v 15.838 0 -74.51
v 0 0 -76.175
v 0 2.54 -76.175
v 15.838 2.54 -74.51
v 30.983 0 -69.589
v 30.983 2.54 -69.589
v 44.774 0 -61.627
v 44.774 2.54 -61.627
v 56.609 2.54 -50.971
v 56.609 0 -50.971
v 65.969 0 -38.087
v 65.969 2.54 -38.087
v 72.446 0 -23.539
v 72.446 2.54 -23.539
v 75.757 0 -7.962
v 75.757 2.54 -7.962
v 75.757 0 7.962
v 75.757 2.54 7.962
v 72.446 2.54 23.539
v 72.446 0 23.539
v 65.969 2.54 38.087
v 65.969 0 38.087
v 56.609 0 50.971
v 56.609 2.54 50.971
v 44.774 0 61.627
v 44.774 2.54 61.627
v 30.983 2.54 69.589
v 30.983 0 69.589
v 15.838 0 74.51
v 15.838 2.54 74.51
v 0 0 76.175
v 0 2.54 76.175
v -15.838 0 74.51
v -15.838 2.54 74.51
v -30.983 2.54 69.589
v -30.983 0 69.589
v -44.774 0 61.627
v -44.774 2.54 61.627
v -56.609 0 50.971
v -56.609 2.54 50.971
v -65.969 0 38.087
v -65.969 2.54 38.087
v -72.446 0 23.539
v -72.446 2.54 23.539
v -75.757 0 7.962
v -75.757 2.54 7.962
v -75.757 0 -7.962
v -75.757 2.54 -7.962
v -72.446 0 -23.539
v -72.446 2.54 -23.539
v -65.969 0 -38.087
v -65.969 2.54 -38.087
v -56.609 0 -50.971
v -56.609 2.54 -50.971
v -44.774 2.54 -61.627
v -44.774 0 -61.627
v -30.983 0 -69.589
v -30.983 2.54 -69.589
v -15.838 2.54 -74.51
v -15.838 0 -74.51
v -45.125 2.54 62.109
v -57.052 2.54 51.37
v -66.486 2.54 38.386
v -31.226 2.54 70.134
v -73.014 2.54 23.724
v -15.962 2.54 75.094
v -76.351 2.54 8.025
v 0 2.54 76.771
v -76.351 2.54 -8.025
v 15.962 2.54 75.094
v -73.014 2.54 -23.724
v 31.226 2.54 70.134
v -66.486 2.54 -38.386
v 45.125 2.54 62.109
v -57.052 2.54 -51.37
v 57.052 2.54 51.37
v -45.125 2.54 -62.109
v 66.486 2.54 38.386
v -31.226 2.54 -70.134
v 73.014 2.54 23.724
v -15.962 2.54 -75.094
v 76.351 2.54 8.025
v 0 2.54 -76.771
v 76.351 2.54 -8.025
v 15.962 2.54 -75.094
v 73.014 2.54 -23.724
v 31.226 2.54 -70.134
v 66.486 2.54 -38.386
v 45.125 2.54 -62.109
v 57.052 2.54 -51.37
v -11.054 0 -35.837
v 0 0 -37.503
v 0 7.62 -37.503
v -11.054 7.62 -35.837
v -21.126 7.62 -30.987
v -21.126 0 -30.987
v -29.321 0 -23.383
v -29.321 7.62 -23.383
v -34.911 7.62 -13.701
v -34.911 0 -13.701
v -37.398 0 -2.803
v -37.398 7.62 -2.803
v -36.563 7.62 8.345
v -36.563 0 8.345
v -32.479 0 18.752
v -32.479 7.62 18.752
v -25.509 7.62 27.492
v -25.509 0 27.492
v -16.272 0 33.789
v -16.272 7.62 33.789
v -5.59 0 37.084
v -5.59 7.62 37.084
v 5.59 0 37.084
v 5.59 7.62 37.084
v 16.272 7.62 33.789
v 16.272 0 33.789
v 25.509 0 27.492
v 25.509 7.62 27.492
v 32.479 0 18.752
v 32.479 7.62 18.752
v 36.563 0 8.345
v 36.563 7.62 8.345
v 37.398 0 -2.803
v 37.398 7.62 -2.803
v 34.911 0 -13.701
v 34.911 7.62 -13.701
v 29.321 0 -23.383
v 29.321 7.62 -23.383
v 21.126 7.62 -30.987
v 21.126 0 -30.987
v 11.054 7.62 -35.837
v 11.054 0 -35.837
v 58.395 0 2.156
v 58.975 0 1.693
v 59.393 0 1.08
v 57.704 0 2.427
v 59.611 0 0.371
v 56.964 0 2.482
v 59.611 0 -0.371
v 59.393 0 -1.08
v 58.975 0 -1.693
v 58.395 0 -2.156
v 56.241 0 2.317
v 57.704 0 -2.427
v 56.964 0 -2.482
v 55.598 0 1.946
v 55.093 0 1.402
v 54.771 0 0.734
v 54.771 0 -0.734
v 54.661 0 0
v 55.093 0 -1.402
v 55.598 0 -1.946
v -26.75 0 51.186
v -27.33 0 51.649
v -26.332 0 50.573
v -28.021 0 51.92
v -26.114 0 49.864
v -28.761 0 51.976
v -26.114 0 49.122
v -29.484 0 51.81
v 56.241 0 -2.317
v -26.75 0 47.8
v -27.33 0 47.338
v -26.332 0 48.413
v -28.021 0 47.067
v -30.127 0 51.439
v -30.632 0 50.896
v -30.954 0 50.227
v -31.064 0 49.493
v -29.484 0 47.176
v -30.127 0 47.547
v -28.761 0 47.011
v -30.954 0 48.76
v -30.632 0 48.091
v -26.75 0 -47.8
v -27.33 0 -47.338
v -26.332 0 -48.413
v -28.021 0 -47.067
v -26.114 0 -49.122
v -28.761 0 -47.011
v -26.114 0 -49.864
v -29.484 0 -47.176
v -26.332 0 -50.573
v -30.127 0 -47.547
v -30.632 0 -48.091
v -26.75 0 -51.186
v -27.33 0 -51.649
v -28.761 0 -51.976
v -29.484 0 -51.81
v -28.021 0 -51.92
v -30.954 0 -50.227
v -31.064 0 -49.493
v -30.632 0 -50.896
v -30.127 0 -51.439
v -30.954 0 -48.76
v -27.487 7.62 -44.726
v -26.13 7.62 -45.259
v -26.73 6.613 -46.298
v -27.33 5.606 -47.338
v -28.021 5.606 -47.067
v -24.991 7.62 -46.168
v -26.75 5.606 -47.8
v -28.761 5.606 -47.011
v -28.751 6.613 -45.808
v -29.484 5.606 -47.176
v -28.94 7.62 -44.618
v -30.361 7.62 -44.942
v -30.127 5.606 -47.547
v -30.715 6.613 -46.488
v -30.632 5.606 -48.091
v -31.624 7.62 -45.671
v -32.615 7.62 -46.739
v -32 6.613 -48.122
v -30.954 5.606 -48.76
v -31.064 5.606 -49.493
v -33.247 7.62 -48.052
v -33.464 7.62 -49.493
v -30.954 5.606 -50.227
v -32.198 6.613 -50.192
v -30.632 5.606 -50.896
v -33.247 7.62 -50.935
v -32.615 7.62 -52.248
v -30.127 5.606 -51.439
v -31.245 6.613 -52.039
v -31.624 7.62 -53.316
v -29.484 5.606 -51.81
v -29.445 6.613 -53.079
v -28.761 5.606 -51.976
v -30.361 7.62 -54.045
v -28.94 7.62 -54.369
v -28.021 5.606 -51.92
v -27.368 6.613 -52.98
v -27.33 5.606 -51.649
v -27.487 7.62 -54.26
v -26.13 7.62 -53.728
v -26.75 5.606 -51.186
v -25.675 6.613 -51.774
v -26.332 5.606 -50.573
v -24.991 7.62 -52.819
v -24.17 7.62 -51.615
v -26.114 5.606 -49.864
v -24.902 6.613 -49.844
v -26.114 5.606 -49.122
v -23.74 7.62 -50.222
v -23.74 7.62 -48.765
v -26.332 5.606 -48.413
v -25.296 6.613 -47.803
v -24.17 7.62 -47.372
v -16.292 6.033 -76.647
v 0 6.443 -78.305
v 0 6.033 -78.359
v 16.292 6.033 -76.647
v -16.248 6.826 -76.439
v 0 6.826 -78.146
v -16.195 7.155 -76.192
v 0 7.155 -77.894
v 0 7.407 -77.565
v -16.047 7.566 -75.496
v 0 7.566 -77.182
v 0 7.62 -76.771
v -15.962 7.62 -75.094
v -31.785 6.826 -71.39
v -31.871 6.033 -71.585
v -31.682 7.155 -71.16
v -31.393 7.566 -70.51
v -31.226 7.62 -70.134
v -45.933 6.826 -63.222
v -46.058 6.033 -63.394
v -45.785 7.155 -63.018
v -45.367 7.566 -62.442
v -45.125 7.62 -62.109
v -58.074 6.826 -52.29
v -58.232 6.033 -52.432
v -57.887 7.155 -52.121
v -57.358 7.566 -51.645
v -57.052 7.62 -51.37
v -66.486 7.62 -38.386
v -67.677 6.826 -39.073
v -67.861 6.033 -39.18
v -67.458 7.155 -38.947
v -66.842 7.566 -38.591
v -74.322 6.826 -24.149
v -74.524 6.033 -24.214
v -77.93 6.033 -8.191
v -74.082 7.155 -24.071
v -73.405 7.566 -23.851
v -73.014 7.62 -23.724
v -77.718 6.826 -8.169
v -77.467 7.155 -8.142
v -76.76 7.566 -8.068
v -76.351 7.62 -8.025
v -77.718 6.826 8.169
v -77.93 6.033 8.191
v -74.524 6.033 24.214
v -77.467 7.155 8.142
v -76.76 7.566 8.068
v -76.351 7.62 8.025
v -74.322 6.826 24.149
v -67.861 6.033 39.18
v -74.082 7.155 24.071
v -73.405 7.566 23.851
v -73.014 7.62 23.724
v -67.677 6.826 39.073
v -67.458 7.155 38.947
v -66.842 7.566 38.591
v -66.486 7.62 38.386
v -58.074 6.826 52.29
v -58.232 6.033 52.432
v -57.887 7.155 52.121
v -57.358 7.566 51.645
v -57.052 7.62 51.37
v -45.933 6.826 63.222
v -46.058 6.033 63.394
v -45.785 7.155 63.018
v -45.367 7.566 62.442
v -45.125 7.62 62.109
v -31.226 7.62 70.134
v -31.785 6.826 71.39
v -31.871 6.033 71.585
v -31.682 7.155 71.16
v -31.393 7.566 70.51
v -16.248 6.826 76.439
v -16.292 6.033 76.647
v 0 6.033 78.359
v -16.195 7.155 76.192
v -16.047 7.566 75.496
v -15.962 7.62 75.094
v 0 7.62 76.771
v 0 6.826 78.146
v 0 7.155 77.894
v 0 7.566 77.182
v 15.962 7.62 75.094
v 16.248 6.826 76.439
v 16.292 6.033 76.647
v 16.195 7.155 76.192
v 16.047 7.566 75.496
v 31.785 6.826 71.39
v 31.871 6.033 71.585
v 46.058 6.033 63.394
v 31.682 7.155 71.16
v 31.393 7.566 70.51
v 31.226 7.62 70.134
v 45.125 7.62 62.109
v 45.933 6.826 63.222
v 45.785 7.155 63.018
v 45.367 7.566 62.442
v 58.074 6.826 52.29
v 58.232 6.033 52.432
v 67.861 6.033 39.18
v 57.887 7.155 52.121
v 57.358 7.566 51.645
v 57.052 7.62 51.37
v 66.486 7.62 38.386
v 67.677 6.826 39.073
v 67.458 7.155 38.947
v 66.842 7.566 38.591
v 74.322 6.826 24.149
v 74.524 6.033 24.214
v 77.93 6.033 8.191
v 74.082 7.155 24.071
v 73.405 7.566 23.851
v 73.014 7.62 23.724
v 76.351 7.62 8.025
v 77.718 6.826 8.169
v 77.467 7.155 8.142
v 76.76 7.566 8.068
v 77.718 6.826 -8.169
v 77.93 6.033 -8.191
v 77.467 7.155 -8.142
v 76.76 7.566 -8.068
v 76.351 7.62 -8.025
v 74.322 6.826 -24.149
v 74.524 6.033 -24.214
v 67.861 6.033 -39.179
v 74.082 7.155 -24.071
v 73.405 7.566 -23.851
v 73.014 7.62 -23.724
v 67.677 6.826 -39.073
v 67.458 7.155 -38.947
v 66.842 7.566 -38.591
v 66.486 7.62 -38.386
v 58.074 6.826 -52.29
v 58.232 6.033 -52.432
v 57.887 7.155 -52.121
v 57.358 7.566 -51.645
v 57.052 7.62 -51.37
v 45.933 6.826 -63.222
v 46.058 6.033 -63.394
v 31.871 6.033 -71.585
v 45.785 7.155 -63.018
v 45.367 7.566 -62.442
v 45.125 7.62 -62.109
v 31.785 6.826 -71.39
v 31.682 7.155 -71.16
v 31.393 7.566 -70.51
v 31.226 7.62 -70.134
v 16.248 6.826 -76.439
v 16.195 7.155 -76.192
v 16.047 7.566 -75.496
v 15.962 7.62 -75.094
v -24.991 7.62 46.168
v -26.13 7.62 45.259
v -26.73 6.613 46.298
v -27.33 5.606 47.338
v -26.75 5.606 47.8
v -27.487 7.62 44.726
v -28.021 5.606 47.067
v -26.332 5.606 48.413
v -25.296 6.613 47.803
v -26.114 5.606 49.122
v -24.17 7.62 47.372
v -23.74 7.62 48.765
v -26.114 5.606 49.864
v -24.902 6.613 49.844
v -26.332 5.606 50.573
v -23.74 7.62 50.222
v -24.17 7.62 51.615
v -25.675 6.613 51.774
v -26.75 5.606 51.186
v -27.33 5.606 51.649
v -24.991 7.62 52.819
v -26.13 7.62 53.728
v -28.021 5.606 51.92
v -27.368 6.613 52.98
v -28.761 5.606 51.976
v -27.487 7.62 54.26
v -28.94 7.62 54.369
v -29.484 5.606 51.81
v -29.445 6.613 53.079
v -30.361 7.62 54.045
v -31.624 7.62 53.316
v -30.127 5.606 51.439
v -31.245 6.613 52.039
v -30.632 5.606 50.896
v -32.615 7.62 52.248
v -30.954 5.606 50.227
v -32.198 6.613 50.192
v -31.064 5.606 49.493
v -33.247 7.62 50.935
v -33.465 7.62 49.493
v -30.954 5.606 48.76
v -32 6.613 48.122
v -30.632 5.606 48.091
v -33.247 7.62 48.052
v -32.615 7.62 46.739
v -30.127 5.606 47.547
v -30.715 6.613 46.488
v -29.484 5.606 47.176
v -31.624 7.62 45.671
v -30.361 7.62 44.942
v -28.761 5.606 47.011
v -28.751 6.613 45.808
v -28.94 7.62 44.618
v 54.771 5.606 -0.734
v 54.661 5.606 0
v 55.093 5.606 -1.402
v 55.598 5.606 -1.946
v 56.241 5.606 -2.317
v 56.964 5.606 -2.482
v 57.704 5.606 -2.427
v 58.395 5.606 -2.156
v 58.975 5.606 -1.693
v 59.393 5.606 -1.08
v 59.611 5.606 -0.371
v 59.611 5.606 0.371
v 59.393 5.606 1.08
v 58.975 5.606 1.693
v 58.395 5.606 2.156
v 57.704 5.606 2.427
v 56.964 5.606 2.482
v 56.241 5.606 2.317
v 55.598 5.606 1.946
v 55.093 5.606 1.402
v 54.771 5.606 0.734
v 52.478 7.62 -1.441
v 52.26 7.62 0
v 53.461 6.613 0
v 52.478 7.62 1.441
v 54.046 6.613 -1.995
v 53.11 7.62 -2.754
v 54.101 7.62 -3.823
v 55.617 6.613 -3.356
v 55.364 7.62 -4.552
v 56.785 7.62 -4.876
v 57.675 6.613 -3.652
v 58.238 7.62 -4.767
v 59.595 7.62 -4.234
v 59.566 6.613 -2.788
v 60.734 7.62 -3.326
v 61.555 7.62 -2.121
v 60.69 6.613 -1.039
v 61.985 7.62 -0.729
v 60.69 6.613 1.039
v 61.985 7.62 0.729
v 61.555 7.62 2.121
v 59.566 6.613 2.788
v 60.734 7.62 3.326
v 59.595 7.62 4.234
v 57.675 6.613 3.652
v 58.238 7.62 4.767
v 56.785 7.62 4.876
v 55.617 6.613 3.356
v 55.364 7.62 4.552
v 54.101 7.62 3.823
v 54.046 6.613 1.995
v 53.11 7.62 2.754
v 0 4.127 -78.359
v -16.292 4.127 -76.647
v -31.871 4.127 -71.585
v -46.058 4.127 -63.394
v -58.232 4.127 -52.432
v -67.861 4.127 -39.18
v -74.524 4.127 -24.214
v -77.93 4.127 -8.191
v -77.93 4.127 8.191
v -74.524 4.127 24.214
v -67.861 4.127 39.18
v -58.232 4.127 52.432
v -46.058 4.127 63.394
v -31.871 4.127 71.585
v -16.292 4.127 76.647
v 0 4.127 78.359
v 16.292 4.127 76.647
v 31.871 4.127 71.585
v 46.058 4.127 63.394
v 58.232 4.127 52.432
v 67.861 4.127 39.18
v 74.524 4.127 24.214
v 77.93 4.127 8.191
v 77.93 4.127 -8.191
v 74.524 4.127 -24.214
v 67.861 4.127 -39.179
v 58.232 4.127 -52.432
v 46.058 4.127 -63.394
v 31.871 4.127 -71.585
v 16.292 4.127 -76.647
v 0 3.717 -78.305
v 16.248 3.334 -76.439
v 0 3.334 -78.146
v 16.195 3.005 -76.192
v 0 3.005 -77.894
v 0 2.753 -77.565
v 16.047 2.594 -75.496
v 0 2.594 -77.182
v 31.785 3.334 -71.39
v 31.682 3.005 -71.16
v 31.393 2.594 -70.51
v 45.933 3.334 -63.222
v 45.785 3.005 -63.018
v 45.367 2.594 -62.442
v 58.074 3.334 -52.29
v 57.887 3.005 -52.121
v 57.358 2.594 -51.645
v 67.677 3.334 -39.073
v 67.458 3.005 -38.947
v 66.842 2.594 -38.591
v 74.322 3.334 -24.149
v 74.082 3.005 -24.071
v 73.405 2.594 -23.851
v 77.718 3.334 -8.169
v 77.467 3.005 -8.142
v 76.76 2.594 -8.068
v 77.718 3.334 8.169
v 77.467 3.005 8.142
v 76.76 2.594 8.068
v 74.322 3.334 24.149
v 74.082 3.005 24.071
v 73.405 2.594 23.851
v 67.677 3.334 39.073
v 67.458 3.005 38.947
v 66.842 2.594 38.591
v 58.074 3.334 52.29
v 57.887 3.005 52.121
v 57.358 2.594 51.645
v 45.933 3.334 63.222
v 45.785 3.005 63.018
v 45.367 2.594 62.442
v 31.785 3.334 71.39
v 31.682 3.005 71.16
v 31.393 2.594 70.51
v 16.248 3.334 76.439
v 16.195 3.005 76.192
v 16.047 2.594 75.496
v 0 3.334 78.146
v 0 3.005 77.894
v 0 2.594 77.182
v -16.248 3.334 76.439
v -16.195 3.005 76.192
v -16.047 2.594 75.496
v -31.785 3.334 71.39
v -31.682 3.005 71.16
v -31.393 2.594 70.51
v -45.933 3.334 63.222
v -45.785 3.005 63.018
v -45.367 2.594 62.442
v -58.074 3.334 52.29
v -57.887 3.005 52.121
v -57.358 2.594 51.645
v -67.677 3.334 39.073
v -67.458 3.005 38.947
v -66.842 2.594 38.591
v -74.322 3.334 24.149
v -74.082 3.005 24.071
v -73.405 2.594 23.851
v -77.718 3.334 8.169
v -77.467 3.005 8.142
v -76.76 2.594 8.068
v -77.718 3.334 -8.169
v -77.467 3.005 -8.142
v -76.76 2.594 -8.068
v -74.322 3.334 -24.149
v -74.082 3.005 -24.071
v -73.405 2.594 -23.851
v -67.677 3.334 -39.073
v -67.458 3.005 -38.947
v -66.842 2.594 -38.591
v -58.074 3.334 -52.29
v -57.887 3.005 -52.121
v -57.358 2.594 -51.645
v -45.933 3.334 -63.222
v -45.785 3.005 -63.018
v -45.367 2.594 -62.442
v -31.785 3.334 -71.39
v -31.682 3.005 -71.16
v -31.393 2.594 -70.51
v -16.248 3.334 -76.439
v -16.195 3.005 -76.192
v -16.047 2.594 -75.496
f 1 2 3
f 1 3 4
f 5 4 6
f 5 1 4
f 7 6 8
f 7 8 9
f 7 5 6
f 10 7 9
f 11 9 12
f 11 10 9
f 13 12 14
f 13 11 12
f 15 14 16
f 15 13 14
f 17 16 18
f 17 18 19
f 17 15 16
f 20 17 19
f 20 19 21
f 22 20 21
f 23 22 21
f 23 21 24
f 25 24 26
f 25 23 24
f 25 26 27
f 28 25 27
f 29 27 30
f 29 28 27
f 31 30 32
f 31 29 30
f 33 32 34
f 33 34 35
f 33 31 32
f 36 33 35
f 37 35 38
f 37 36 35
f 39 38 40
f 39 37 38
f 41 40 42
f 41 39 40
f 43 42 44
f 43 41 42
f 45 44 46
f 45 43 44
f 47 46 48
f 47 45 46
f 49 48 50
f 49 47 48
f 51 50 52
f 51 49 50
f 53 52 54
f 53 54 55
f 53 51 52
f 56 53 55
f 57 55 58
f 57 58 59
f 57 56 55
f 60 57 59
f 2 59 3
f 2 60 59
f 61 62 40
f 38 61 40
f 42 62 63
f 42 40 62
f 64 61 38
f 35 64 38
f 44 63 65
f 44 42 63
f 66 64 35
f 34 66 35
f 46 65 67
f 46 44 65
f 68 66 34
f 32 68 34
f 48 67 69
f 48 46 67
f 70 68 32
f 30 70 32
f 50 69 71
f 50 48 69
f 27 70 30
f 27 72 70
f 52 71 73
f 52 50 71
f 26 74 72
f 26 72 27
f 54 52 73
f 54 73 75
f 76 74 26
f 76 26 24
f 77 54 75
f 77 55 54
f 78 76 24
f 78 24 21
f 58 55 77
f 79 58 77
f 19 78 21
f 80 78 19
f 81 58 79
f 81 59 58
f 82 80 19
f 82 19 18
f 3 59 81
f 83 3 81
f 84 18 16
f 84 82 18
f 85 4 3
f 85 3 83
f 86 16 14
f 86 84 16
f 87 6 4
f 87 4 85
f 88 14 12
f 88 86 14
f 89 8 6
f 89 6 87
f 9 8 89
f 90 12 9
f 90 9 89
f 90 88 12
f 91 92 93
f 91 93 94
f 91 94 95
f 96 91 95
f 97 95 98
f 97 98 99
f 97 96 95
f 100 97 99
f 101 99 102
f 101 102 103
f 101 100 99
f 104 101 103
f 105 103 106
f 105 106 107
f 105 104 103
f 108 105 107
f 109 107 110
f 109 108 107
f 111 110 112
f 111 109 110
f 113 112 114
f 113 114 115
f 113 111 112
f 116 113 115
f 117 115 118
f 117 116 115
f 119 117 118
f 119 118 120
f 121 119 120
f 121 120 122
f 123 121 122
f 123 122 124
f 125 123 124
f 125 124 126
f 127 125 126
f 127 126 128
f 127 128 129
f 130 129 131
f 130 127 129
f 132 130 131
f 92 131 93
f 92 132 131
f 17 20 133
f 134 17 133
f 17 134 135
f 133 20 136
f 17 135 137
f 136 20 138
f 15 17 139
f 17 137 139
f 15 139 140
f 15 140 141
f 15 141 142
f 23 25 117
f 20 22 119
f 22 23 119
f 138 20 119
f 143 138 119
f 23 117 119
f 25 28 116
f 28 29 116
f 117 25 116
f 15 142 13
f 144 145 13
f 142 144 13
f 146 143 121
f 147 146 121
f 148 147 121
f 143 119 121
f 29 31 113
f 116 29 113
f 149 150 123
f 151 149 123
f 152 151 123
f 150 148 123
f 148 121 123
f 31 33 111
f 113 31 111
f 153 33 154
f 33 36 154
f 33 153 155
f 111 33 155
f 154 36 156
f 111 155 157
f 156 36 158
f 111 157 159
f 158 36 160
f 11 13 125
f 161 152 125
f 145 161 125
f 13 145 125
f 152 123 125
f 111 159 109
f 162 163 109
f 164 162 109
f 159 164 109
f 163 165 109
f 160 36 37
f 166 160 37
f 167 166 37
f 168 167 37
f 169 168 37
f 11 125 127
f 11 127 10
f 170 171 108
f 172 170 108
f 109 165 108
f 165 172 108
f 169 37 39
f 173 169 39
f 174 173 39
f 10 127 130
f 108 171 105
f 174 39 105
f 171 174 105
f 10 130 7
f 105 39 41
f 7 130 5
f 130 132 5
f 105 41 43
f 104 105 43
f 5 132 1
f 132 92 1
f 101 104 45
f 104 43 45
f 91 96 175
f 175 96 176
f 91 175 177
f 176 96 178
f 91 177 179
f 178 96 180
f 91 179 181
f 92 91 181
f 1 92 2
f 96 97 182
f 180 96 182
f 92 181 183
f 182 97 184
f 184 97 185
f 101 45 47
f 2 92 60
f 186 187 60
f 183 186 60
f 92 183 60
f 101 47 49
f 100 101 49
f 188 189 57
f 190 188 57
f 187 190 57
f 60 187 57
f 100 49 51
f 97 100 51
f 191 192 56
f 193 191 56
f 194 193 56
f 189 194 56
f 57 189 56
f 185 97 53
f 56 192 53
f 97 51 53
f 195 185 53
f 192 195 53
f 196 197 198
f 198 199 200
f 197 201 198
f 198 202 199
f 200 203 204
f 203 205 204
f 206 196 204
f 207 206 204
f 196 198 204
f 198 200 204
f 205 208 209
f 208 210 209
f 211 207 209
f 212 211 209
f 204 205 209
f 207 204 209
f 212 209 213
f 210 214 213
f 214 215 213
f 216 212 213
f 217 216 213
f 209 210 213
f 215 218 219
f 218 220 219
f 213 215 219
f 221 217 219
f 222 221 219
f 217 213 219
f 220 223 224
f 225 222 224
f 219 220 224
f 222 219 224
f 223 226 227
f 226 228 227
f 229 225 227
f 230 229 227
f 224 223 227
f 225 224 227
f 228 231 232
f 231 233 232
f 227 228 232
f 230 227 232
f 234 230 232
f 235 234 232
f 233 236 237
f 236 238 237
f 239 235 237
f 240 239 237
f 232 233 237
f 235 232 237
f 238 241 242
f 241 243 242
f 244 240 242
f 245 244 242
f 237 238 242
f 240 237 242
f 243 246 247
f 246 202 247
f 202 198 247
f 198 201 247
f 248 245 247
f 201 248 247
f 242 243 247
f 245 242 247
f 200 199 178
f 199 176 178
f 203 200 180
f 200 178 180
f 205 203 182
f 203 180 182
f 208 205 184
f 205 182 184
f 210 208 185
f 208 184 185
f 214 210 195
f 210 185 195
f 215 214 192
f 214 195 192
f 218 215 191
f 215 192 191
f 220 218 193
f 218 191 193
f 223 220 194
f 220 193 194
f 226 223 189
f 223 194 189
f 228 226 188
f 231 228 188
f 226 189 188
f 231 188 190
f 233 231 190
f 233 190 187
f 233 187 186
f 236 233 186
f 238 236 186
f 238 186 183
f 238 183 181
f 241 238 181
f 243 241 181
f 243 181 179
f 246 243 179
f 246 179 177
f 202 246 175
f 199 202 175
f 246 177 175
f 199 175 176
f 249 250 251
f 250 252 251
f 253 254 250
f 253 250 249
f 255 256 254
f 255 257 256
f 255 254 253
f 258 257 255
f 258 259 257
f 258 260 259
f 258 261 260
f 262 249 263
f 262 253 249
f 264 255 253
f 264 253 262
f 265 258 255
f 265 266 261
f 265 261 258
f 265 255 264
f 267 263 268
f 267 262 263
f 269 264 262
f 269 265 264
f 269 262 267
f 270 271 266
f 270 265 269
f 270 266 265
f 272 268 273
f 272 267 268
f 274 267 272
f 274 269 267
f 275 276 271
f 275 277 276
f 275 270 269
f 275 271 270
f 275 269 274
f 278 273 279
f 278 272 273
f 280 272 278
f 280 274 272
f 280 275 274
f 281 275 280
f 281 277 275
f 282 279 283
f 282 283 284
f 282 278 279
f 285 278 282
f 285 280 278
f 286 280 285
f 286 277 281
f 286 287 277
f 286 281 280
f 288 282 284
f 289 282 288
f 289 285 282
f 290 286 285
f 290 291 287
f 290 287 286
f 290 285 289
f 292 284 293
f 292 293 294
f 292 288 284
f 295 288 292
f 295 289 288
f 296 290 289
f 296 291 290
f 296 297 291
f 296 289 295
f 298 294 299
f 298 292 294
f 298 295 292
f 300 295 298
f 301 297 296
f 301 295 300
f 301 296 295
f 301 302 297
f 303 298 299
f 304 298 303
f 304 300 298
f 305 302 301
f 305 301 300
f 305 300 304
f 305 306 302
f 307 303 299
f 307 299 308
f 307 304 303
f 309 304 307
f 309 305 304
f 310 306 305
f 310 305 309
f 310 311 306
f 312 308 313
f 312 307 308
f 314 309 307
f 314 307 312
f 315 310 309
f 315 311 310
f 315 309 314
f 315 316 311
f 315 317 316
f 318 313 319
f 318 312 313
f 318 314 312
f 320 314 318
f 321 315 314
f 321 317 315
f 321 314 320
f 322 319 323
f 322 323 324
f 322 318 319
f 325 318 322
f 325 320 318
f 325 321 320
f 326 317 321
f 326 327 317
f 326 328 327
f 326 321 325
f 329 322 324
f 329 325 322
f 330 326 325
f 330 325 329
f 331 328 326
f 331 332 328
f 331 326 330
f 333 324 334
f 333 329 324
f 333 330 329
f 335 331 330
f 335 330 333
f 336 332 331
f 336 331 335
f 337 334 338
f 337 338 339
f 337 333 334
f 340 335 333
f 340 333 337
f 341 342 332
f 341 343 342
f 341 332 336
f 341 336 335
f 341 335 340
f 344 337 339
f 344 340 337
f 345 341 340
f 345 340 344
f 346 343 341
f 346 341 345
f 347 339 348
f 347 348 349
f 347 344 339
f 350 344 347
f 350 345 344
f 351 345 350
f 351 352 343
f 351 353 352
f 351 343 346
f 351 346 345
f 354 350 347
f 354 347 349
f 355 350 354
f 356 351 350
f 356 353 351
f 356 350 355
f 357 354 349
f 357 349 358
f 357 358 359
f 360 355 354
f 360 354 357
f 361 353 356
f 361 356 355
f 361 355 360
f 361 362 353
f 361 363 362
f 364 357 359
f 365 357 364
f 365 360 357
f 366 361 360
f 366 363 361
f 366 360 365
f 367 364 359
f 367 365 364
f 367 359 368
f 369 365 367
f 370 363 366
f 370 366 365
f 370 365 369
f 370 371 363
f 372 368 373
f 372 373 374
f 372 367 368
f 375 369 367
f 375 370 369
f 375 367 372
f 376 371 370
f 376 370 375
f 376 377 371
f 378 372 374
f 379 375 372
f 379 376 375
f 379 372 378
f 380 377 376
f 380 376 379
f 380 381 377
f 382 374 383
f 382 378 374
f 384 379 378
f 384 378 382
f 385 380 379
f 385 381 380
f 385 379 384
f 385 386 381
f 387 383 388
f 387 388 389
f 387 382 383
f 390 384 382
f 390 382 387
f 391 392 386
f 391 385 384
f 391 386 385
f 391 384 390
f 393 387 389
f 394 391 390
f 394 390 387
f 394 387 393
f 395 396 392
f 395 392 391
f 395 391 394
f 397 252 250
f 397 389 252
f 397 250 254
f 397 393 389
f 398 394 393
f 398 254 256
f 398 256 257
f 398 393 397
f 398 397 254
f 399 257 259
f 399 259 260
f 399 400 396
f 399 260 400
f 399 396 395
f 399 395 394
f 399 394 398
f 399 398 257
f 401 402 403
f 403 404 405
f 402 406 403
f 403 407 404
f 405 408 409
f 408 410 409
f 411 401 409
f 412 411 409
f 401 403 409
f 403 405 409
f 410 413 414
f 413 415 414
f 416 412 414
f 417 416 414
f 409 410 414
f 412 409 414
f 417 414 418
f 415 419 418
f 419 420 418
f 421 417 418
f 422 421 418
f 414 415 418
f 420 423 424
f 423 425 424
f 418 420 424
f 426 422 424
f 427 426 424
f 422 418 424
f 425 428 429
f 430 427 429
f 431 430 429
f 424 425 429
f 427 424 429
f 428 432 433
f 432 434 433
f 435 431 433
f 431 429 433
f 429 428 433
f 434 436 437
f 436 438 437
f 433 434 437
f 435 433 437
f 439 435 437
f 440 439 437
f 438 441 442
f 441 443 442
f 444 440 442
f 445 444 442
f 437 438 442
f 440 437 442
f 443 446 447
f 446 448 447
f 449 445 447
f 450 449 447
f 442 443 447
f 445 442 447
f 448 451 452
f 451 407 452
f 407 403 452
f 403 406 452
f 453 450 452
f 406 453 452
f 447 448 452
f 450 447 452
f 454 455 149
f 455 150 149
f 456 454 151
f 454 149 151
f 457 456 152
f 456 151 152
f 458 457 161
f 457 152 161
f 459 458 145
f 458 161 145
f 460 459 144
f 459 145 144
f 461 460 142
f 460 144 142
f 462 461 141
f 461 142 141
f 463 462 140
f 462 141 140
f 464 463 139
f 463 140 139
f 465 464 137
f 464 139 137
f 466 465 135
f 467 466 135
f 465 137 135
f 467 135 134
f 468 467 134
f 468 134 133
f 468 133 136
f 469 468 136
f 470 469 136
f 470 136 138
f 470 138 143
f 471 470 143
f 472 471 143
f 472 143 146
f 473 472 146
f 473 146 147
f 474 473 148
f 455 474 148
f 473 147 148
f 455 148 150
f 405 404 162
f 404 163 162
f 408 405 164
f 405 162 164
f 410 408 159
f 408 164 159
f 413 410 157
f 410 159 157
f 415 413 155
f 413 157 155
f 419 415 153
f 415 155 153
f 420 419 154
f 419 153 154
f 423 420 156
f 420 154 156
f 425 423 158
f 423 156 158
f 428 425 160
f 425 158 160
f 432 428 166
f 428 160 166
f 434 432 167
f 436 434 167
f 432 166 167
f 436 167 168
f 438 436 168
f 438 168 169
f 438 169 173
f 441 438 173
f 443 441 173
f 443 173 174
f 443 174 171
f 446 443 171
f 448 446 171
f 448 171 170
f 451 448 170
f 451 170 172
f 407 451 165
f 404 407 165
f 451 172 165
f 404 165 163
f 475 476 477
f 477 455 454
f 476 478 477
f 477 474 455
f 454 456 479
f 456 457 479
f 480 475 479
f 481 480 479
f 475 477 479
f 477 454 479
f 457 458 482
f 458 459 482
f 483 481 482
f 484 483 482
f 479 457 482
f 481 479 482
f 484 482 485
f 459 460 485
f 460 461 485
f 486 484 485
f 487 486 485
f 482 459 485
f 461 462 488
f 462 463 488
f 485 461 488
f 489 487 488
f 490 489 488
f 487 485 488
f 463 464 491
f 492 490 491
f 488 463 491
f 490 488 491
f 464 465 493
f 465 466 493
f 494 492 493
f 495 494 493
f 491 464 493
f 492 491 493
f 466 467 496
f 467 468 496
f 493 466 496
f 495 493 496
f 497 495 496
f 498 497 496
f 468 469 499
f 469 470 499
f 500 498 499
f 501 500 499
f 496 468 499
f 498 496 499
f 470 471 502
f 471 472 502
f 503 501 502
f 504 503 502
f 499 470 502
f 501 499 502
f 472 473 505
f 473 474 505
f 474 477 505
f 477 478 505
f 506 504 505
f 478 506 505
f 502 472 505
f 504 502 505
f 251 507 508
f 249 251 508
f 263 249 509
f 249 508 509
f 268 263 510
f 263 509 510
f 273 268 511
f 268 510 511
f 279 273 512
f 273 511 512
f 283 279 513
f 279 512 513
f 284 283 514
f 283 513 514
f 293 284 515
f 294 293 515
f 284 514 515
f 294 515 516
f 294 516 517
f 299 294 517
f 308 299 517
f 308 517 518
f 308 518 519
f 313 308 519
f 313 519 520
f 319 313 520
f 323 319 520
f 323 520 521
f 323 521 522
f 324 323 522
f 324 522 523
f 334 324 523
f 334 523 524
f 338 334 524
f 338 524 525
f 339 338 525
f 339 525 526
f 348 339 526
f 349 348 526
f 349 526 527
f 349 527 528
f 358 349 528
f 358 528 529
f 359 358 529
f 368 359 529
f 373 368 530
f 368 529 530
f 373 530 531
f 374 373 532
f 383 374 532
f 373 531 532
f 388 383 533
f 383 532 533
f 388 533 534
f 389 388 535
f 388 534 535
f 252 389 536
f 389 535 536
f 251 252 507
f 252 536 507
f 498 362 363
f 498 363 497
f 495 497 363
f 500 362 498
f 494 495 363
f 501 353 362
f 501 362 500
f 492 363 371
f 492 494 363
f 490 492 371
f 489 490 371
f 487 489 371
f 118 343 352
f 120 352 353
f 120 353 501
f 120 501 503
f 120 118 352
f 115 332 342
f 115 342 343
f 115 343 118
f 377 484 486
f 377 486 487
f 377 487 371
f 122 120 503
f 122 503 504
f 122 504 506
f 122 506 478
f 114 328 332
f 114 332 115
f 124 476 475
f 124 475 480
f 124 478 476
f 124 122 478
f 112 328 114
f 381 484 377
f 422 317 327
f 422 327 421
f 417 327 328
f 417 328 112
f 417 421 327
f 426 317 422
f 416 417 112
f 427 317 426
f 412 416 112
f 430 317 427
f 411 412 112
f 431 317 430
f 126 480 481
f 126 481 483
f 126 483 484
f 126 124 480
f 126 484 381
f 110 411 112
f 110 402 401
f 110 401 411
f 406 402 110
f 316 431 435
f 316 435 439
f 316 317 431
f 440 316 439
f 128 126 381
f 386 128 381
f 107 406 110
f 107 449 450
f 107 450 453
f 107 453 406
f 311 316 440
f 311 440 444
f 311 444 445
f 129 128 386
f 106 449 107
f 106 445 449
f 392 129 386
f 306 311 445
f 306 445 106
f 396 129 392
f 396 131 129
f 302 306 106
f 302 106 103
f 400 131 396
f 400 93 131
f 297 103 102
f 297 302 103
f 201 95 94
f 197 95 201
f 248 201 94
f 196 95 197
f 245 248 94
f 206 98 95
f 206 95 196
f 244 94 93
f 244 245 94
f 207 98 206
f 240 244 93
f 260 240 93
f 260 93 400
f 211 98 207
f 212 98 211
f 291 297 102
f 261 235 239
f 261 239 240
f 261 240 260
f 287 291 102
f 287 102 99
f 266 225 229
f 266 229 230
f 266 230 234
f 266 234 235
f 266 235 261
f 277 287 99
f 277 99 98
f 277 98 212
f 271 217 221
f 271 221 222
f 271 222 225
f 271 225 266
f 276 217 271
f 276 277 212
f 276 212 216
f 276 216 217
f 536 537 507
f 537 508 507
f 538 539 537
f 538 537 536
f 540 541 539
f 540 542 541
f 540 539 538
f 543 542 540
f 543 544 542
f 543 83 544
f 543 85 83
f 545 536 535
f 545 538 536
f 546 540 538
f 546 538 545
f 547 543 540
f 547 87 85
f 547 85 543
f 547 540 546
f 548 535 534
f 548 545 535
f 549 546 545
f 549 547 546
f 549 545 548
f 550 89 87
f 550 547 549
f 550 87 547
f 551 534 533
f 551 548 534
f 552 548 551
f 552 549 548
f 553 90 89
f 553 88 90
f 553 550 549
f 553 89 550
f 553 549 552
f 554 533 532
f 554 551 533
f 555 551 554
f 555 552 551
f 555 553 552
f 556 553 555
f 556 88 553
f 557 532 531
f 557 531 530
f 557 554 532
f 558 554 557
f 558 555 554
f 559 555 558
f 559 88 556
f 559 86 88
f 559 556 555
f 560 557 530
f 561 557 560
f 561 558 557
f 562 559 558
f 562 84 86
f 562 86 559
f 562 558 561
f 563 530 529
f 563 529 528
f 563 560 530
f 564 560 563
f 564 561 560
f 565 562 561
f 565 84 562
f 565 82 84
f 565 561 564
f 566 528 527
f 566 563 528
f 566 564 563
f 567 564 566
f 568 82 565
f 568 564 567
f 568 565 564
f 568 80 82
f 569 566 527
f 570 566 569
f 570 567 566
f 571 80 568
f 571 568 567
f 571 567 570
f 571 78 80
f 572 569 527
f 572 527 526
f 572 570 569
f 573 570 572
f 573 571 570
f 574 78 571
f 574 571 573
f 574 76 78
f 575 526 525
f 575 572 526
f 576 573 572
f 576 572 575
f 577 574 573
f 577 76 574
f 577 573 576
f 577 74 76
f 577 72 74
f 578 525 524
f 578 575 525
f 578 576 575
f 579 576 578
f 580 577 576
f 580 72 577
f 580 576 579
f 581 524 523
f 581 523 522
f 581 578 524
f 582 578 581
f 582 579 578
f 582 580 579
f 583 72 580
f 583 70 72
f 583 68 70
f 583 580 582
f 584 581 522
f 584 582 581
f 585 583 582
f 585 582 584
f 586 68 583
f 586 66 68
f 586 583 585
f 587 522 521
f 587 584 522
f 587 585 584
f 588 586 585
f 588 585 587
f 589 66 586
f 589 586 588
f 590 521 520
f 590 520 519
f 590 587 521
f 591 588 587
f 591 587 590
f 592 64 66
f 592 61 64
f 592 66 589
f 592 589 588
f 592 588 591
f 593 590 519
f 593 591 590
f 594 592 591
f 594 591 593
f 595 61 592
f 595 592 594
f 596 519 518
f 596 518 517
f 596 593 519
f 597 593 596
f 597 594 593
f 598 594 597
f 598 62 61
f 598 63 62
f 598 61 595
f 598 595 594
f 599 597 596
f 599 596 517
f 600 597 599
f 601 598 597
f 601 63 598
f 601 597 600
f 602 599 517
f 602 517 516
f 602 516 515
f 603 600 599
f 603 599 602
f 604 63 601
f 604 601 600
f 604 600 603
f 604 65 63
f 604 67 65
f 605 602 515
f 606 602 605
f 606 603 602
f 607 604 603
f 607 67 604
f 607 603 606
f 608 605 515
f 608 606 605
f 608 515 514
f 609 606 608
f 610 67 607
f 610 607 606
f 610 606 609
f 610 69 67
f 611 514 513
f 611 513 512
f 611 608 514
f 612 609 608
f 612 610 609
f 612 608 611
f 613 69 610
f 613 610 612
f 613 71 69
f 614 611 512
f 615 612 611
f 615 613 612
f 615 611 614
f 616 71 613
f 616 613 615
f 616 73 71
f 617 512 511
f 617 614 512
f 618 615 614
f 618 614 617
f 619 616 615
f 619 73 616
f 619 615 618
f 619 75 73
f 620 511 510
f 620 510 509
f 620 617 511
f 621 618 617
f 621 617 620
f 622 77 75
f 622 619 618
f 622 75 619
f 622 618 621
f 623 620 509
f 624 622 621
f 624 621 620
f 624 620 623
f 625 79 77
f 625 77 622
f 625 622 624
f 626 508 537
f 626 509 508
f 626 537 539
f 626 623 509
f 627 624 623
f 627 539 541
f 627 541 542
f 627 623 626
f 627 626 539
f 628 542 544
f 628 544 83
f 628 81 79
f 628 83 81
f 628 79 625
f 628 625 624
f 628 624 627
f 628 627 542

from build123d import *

# Parameters (mm, degrees)
SKETCH1_R                                          = 78.359
SKETCH1_R_2                                        = 37.5031
BOSS_EXTRUDE1_DEPTH                                = 7.62
CSK_FOR_10_FLAT_HEAD_MACHINE_SCREW_100_D           = 4.9784
CSK_FOR_10_FLAT_HEAD_MACHINE_SCREW_100_CSINK_D     = 9.779
CSK_FOR_10_FLAT_HEAD_MACHINE_SCREW_100_CSINK_ANGLE = 100
CIRPATTERN1_COUNT                                  = 3
SKETCH6_R                                          = 78.359
SKETCH6_R_2                                        = 76.1746
CUT_EXTRUDE1_DEPTH                                 = 2.54
FILLET1_R                                          = 1.5875


with BuildPart() as part:
    # Sketch1 → Boss-Extrude1 (new body)
    with BuildSketch(Plane(origin=(0, 0, 0), x_dir=(1, 0, 0), z_dir=(0, 1, 0))):
        with Locations(Location((0, 0, 0), (0, 0, 90))):
            Circle(SKETCH1_R)
        with Locations(Location((0, 0, 0), (0, 0, 90))):
            Circle(SKETCH1_R_2, mode=Mode.SUBTRACT)
    extrude(amount=BOSS_EXTRUDE1_DEPTH)

    # CSK for #10 Flat Head Machine Screw (100)1 (through all)
    with Locations(Plane(origin=(0, 7.62, 0), x_dir=(1, 0, 0), z_dir=(0, 1, 0))):
        with Locations((57.15, 0)):
            csk_for_10_flat_head_machine_screw_100 = CounterSinkHole(CSK_FOR_10_FLAT_HEAD_MACHINE_SCREW_100_D / 2, CSK_FOR_10_FLAT_HEAD_MACHINE_SCREW_100_CSINK_D / 2, counter_sink_angle=CSK_FOR_10_FLAT_HEAD_MACHINE_SCREW_100_CSINK_ANGLE)

    # CirPattern1: CSK for #10 Flat Head Machine Screw (100)1 ×3 about axis
    cirpattern1_axis = Axis((0, 0, 0), (0, 1, 0))
    for i in range(1, CIRPATTERN1_COUNT):
        add(csk_for_10_flat_head_machine_screw_100.rotate(cirpattern1_axis, i * 360 / CIRPATTERN1_COUNT), mode=Mode.SUBTRACT)

    # Sketch6 → Cut-Extrude1 (cut)
    with BuildSketch(Plane.XZ):
        with Locations(Location((0, 0, 0), (0, 0, 270))):
            Circle(SKETCH6_R)
        with Locations(Location((0, 0, 0), (0, 0, 270))):
            Circle(SKETCH6_R_2, mode=Mode.SUBTRACT)
    extrude(amount=-CUT_EXTRUDE1_DEPTH, mode=Mode.SUBTRACT)

    # Fillet1
    fillet1_edges = [part.edges().sort_by_distance(p)[0] for p in [
        (0, 2.54, 78.359),
        (0, 7.62, 78.359),
    ]]
    fillet(fillet1_edges, radius=FILLET1_R)


solid = part.part
